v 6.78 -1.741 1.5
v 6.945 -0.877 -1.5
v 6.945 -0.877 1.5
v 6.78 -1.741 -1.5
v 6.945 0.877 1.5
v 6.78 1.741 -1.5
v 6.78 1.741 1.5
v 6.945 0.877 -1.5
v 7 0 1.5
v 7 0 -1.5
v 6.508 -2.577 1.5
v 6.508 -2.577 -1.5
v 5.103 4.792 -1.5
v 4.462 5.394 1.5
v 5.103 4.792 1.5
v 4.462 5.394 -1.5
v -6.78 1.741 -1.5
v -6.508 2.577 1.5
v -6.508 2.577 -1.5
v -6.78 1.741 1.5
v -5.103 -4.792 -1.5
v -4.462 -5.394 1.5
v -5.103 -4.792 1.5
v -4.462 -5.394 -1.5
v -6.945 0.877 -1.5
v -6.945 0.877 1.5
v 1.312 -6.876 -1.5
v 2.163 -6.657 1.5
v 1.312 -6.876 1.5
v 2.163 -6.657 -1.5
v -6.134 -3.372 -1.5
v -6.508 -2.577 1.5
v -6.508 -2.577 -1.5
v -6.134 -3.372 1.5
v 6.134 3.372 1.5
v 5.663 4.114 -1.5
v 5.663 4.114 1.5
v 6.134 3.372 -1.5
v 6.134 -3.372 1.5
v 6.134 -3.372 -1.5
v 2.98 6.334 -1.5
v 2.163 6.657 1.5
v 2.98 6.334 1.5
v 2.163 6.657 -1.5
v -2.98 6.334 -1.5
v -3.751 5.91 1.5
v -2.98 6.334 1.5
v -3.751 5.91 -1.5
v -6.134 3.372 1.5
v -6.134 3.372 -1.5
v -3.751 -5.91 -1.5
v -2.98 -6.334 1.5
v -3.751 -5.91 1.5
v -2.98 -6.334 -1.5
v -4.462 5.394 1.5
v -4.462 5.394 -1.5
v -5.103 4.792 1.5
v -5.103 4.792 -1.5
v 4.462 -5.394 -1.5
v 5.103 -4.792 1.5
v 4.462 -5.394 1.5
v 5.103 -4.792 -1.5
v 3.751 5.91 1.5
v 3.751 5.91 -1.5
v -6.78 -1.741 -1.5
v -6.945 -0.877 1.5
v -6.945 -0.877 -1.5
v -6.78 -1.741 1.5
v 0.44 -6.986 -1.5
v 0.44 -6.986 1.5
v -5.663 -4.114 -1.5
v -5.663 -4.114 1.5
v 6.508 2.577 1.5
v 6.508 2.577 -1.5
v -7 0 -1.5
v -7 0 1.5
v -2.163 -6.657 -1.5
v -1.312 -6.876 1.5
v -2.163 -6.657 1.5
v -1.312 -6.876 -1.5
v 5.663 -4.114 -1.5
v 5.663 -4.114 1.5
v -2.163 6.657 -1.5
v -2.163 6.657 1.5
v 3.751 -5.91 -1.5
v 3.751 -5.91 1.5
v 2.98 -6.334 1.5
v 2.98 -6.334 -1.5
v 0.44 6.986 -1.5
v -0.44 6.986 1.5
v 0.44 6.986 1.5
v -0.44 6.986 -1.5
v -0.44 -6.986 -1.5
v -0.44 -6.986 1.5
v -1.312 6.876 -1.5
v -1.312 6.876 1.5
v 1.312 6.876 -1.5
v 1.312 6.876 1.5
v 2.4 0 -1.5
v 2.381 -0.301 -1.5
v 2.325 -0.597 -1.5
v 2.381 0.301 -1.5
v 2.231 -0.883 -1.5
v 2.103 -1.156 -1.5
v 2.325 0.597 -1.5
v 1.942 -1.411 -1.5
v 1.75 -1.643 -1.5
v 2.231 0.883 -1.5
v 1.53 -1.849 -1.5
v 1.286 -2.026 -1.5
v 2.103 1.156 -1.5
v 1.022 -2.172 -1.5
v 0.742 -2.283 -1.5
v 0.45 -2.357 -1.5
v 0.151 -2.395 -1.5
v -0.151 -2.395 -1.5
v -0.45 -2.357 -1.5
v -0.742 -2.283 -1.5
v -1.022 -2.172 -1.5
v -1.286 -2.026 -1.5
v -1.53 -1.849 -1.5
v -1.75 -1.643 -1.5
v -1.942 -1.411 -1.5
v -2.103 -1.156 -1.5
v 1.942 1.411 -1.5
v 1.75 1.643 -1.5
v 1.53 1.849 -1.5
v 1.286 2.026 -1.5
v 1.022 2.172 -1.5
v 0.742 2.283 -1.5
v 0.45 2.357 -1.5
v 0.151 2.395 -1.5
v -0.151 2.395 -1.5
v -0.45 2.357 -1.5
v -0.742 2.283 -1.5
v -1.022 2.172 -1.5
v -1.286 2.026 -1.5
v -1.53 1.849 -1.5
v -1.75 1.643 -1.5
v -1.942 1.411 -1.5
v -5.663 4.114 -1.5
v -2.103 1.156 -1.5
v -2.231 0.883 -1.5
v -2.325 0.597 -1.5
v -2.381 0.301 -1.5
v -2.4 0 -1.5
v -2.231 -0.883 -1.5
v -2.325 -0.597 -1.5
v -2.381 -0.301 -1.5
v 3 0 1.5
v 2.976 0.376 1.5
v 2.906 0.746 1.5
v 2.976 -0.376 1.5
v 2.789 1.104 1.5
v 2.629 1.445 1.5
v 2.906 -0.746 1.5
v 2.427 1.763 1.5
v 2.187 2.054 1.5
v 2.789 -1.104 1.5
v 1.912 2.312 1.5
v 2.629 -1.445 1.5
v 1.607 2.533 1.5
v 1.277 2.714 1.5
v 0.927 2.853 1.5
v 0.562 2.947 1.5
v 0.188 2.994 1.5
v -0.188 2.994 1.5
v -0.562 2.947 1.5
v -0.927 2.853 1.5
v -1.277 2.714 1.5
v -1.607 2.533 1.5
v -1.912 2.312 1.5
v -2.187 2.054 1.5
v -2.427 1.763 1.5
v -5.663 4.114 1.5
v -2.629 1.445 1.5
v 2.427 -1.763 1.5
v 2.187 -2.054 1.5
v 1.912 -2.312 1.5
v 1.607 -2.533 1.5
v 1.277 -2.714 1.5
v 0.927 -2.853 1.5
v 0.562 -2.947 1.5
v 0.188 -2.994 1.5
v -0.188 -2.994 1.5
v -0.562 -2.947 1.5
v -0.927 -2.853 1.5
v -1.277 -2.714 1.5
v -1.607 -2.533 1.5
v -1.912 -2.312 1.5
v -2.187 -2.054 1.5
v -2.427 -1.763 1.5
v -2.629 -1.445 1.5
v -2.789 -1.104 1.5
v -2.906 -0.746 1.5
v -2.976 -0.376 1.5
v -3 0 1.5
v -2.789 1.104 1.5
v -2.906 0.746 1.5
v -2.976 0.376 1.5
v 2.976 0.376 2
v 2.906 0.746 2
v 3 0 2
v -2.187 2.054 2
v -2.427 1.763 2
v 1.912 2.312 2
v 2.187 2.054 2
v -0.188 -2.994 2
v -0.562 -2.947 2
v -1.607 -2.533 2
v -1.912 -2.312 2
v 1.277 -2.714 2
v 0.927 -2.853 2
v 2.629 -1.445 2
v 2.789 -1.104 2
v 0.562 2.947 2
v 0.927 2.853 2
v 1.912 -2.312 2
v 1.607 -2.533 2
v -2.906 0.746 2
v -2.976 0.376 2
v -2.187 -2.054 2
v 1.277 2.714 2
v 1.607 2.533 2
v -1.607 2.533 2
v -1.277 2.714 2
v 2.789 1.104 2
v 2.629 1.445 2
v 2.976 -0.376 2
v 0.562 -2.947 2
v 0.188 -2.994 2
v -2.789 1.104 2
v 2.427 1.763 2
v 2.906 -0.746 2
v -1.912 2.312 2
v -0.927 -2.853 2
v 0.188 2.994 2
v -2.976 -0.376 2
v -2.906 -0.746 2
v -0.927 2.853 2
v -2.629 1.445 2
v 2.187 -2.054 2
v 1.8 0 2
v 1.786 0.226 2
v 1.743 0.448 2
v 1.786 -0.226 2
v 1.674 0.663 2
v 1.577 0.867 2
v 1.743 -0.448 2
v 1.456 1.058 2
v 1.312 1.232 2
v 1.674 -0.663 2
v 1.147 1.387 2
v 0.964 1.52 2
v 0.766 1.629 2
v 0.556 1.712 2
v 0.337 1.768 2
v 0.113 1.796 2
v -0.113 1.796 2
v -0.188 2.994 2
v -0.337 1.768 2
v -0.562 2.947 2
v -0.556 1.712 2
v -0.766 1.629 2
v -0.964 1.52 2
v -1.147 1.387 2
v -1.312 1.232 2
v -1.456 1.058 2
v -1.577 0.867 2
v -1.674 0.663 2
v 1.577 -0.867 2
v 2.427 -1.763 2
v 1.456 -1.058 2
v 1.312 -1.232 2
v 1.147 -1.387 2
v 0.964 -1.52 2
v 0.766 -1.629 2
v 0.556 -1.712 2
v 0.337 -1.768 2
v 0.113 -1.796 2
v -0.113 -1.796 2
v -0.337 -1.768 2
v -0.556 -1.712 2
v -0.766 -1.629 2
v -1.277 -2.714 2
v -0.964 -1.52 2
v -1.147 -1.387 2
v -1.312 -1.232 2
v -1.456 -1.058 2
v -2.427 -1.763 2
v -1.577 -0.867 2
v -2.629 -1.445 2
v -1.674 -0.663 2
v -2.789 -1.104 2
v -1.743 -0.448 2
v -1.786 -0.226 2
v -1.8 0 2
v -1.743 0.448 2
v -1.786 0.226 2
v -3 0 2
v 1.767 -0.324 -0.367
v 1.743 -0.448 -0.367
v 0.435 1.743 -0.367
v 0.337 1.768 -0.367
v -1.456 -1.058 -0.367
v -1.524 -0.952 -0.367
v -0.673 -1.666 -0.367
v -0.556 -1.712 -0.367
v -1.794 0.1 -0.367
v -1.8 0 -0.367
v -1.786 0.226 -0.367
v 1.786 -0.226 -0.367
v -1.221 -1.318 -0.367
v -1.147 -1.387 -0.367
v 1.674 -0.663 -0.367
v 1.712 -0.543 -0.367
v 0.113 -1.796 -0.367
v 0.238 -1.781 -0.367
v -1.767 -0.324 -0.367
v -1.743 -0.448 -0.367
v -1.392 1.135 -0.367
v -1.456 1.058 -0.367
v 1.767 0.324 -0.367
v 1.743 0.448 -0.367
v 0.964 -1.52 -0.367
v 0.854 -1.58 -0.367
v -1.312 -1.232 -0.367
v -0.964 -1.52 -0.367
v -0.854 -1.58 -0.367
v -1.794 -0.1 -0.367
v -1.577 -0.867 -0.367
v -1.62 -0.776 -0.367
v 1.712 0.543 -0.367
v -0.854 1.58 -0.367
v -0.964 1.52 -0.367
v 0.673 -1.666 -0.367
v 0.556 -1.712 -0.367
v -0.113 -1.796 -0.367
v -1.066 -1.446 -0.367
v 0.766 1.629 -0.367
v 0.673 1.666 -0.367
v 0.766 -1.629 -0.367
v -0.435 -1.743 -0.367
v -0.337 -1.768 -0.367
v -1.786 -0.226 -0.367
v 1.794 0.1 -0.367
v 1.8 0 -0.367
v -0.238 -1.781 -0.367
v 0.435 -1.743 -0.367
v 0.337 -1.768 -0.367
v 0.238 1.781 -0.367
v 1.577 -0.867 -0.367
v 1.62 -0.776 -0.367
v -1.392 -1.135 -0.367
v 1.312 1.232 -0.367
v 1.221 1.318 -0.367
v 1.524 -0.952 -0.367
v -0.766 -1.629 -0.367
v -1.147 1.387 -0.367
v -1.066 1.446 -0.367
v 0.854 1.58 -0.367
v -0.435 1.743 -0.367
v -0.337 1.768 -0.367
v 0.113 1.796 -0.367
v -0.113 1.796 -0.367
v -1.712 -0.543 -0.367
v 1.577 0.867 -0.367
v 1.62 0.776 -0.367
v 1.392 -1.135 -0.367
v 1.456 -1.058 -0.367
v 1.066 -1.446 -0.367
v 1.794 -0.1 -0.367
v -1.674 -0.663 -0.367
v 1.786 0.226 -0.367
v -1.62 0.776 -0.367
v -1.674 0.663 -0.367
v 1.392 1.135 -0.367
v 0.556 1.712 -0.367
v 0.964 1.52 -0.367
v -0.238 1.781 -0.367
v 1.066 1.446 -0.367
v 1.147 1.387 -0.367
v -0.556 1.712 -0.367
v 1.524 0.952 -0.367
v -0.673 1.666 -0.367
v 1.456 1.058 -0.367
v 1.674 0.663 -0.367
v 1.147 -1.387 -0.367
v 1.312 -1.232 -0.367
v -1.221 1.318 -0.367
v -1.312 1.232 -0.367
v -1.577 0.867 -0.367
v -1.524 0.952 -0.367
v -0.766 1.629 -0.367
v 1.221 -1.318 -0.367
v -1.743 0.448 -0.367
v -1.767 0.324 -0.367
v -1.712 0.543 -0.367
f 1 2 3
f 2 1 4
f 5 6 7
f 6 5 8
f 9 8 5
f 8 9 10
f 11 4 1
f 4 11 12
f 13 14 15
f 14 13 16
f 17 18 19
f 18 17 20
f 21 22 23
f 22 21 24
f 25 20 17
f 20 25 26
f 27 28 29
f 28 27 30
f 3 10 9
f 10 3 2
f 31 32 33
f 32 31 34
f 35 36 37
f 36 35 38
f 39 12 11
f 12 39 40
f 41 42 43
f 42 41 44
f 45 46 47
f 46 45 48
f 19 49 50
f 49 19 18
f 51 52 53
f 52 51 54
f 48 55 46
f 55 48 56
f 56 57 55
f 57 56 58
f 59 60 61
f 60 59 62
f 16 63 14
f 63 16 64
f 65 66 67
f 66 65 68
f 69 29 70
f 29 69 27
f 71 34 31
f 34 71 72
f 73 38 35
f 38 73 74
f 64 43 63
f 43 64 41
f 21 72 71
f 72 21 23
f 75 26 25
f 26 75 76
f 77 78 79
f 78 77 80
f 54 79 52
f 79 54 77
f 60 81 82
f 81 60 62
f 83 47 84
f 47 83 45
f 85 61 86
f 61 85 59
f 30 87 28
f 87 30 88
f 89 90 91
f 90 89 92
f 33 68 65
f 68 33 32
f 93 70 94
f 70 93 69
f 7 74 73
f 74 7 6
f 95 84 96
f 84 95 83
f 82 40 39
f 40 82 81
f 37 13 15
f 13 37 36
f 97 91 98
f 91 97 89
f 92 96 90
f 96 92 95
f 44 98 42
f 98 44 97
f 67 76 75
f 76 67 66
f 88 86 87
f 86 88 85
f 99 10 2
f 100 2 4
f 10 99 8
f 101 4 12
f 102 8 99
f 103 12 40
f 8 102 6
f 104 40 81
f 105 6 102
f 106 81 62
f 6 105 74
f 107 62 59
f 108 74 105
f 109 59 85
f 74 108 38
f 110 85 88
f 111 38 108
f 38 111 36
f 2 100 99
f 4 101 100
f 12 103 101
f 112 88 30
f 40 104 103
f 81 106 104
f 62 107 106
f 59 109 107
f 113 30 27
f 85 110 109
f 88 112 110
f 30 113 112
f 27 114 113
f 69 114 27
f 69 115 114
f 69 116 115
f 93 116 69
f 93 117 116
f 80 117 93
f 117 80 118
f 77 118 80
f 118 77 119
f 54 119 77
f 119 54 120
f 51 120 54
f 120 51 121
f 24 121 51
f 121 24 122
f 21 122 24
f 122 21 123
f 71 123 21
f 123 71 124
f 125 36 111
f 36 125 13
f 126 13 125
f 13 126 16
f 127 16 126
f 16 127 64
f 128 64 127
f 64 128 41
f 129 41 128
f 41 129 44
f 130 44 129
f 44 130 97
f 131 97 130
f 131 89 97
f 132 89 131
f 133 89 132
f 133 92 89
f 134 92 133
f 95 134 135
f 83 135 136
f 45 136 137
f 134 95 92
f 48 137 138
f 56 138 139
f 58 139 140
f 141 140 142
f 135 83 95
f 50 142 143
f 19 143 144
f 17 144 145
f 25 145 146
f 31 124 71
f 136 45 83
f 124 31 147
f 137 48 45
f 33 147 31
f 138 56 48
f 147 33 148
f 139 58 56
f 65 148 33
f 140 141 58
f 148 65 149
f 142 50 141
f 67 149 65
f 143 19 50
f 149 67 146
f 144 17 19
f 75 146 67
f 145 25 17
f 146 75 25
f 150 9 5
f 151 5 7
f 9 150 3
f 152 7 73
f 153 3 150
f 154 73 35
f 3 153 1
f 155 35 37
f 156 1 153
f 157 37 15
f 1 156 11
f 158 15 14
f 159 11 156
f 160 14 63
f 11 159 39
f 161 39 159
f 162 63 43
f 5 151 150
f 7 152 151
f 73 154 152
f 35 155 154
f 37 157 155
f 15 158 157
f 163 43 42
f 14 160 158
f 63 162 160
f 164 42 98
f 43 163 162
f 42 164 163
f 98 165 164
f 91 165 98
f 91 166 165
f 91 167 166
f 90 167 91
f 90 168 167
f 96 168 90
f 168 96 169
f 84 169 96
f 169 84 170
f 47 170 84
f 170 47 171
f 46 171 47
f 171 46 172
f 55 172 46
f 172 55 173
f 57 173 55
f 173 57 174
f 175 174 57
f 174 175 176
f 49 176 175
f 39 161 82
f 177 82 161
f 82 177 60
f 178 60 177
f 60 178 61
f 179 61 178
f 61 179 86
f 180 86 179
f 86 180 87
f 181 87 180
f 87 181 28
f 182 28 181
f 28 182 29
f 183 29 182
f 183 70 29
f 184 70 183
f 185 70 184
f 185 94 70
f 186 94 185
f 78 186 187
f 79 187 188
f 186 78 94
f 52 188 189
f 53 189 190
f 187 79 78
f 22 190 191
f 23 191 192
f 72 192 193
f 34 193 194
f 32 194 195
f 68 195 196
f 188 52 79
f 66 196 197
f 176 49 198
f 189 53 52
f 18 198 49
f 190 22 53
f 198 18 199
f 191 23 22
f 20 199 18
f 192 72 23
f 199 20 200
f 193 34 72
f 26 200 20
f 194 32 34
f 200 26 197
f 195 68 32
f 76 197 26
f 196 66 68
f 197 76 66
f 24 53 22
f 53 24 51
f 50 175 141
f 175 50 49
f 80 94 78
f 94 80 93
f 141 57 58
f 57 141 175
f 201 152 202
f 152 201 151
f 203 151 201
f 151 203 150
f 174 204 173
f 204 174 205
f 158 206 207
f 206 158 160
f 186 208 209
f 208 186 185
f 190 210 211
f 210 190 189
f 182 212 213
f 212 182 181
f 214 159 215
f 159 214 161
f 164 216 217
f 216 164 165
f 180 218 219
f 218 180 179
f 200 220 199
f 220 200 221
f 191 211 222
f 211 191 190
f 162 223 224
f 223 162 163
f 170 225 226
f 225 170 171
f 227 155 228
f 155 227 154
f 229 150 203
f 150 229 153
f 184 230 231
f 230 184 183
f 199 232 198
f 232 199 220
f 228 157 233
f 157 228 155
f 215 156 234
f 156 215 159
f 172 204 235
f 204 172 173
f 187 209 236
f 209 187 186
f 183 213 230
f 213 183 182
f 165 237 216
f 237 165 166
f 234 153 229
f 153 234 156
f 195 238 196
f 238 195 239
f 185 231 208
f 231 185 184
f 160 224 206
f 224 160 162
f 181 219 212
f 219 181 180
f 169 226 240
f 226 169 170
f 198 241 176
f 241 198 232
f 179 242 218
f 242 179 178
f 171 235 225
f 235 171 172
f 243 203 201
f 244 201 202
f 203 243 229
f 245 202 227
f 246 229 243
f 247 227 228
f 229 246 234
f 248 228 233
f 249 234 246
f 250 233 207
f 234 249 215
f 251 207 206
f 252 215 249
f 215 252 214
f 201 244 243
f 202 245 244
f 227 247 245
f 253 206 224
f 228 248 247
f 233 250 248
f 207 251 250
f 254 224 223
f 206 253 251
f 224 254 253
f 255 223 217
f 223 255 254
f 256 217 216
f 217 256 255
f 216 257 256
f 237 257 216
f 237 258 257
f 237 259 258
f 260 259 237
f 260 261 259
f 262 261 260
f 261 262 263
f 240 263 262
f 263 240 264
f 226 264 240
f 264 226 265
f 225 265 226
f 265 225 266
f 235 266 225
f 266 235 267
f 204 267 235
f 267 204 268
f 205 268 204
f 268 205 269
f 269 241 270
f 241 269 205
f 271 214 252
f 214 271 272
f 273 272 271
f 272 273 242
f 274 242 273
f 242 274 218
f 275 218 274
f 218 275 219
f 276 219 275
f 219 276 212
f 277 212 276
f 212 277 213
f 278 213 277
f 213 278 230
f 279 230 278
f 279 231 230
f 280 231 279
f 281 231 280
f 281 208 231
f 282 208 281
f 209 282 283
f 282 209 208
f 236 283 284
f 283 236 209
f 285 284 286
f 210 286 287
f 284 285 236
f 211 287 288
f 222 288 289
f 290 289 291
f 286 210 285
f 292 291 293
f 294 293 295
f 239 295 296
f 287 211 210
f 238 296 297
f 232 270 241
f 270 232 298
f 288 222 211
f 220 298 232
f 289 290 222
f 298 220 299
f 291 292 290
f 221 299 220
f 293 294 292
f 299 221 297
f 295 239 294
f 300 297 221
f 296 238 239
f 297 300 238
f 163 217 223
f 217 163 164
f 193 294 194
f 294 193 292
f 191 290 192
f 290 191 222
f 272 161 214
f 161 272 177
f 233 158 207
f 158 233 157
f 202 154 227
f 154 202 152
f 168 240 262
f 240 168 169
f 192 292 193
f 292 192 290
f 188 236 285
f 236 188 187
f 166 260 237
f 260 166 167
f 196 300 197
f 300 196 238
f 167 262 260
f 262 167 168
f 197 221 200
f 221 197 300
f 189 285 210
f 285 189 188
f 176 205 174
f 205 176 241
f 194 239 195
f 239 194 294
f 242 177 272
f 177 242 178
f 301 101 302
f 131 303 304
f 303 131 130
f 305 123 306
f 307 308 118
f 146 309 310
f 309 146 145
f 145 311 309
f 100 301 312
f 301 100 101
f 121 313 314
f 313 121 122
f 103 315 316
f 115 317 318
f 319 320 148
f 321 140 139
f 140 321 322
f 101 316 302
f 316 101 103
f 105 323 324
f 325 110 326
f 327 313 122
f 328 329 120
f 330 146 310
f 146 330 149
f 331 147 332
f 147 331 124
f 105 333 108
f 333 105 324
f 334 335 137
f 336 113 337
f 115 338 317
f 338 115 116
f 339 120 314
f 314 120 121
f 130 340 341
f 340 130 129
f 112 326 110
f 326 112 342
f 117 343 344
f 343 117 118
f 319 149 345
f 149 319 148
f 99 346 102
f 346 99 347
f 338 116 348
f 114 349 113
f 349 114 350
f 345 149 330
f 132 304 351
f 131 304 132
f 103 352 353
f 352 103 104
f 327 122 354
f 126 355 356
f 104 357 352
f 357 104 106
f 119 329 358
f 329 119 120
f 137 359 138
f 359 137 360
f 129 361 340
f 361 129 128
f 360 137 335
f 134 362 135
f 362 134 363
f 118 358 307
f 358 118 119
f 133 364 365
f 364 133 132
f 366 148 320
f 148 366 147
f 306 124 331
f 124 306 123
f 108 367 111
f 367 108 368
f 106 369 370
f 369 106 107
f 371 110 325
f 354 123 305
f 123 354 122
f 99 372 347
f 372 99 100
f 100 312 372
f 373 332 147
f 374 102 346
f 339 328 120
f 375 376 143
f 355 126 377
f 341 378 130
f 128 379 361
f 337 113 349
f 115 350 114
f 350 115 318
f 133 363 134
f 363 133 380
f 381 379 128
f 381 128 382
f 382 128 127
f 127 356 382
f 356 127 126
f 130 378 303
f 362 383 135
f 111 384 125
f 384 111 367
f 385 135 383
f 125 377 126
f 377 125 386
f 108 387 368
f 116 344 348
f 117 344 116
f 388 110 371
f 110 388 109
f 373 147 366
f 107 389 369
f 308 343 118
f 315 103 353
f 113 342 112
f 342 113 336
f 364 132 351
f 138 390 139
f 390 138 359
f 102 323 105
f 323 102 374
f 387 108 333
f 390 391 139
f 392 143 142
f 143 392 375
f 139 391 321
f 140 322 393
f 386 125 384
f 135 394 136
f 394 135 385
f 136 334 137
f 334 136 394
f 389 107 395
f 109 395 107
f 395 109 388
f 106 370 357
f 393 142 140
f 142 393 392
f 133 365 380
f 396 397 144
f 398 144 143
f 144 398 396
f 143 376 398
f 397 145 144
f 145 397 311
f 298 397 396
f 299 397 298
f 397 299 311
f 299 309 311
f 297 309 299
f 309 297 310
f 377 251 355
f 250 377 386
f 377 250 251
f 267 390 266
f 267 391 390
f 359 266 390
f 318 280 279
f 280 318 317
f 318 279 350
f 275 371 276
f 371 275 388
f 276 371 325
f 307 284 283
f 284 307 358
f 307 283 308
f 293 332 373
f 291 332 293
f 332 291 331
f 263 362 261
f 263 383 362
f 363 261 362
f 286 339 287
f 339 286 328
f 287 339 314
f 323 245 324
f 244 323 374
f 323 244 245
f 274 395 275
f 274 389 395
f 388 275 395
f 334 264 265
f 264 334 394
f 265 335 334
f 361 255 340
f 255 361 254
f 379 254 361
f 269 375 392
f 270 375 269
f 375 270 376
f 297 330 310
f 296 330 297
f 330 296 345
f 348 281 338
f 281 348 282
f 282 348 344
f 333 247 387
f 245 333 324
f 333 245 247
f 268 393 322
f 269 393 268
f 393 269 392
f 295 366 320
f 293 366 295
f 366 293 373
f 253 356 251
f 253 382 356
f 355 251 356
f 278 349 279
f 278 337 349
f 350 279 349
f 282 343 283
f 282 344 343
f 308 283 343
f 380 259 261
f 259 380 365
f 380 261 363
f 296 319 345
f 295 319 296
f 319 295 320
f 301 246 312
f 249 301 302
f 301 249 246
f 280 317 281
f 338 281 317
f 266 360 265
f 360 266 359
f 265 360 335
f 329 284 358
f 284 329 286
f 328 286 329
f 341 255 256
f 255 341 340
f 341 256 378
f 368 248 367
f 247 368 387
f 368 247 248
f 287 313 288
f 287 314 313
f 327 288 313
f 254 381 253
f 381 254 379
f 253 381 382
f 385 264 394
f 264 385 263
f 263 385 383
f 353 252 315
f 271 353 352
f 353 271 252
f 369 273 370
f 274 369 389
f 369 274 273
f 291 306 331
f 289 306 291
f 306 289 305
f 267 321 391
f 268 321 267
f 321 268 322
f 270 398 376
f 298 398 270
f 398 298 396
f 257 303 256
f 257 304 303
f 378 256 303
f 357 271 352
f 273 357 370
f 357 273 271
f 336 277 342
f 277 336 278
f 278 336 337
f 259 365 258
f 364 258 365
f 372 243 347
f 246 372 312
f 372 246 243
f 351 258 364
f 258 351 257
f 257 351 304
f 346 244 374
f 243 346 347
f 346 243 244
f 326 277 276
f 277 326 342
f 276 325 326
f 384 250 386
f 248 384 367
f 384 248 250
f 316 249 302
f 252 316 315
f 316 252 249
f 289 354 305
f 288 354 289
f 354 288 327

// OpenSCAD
$fn = 50;


difference() {
	union() {
		translate(v = [0, 0, -1.5000000000]) {
			cylinder(h = 3, r = 7.0000000000);
		}
		translate(v = [0, 0, -1.5000000000]) {
			cylinder(h = 3.5000000000, r = 3.0000000000);
		}
	}
	union() {
		translate(v = [0, 0, -1.5000000000]) {
			rotate(a = [0, 180, 0]) {
				difference() {
					union() {
						translate(v = [0, 0, -1.7000000000]) {
							cylinder(h = 1.7000000000, r1 = 1.5000000000, r2 = 2.4000000000);
						}
						translate(v = [0, 0, -3.5000000000]) {
							cylinder(h = 3.5000000000, r = 1.5000000000);
						}
						translate(v = [0, 0, -3.5000000000]) {
							cylinder(h = 3.5000000000, r = 1.8000000000);
						}
						translate(v = [0, 0, -3.5000000000]) {
							cylinder(h = 3.5000000000, r = 1.5000000000);
						}
					}
					union();
				}
			}
		}
		translate(v = [0, 0, -50.0000000000]) {
			cylinder(h = 100, r = 1.5000000000);
		}
	}
}
